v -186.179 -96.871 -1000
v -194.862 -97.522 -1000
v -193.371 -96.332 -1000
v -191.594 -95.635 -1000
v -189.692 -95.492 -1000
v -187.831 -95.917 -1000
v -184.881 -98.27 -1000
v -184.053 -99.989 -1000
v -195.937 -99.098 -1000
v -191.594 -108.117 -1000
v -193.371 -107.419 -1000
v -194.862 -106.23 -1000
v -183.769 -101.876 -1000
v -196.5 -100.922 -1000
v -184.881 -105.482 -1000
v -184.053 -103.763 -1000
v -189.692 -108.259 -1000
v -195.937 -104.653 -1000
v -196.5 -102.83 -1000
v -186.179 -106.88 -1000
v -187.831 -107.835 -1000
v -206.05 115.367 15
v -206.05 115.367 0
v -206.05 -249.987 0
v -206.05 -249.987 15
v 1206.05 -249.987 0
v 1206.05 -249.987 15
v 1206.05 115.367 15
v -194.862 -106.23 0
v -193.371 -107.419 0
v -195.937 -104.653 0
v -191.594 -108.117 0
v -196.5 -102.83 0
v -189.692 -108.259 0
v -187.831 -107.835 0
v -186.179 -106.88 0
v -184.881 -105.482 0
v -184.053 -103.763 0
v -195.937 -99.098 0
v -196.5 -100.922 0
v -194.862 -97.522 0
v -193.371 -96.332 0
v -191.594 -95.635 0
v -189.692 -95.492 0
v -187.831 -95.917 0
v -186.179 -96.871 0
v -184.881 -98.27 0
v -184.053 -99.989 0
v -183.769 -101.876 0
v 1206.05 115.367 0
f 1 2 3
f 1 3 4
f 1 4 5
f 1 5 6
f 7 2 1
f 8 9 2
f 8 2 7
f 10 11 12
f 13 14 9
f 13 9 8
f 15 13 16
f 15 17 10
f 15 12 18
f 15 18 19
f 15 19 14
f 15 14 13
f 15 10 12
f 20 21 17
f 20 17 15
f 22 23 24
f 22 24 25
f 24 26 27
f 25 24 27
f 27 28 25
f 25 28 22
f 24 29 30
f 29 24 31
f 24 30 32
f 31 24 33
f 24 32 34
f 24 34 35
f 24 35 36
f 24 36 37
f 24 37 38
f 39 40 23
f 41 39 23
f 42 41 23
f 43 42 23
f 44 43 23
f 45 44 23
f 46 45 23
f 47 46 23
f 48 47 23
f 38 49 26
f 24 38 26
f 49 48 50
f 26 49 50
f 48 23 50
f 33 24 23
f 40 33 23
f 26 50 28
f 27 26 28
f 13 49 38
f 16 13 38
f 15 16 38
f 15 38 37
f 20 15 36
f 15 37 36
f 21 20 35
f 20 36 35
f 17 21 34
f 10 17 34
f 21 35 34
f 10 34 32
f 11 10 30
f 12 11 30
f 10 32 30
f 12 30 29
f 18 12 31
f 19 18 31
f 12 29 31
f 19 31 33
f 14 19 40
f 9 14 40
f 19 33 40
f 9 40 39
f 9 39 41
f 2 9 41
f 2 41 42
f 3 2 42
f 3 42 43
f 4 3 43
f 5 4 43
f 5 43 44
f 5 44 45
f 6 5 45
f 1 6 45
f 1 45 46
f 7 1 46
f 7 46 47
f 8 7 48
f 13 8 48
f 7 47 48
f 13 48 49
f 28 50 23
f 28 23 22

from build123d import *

# Parameters (mm, degrees)
F0_W     = 412.1005833149
F0_H     = 230.7337969542
F1_DEPTH = 15
F2_R     = 6.4013337275
F3_DEPTH = 1000
F4_DEPTH = 1000
F5_DEPTH = 134.62


with BuildPart() as f1:
    # F0 (on Top) → F1 (new body)
    with BuildSketch(Plane.XY):
        Rectangle(F0_W, F0_H)
    extrude(amount=F1_DEPTH)

    # F2 (on face) → F3 (join)
    with BuildSketch(Plane(origin=(0, 0, 0), x_dir=(1, 0, 0), z_dir=(0, 0, -1))):
        with Locations((-190.1699453592, 101.8757298589)):
            Circle(F2_R)
    extrude(amount=F3_DEPTH)

    # F4 (add): a face of the model
    f4_faces = [f1.faces().sort_by_distance(p)[0] for p in [
        (206.0502916574, 0, 7.5),
    ]]
    extrude(f4_faces, amount=F4_DEPTH)

    # F5 (add): a face of the model
    f5_faces = [f1.faces().sort_by_distance(p)[0] for p in [
        (500, -115.3668984771, 7.5),
    ]]
    extrude(f5_faces, amount=F5_DEPTH)


solid = f1.part
